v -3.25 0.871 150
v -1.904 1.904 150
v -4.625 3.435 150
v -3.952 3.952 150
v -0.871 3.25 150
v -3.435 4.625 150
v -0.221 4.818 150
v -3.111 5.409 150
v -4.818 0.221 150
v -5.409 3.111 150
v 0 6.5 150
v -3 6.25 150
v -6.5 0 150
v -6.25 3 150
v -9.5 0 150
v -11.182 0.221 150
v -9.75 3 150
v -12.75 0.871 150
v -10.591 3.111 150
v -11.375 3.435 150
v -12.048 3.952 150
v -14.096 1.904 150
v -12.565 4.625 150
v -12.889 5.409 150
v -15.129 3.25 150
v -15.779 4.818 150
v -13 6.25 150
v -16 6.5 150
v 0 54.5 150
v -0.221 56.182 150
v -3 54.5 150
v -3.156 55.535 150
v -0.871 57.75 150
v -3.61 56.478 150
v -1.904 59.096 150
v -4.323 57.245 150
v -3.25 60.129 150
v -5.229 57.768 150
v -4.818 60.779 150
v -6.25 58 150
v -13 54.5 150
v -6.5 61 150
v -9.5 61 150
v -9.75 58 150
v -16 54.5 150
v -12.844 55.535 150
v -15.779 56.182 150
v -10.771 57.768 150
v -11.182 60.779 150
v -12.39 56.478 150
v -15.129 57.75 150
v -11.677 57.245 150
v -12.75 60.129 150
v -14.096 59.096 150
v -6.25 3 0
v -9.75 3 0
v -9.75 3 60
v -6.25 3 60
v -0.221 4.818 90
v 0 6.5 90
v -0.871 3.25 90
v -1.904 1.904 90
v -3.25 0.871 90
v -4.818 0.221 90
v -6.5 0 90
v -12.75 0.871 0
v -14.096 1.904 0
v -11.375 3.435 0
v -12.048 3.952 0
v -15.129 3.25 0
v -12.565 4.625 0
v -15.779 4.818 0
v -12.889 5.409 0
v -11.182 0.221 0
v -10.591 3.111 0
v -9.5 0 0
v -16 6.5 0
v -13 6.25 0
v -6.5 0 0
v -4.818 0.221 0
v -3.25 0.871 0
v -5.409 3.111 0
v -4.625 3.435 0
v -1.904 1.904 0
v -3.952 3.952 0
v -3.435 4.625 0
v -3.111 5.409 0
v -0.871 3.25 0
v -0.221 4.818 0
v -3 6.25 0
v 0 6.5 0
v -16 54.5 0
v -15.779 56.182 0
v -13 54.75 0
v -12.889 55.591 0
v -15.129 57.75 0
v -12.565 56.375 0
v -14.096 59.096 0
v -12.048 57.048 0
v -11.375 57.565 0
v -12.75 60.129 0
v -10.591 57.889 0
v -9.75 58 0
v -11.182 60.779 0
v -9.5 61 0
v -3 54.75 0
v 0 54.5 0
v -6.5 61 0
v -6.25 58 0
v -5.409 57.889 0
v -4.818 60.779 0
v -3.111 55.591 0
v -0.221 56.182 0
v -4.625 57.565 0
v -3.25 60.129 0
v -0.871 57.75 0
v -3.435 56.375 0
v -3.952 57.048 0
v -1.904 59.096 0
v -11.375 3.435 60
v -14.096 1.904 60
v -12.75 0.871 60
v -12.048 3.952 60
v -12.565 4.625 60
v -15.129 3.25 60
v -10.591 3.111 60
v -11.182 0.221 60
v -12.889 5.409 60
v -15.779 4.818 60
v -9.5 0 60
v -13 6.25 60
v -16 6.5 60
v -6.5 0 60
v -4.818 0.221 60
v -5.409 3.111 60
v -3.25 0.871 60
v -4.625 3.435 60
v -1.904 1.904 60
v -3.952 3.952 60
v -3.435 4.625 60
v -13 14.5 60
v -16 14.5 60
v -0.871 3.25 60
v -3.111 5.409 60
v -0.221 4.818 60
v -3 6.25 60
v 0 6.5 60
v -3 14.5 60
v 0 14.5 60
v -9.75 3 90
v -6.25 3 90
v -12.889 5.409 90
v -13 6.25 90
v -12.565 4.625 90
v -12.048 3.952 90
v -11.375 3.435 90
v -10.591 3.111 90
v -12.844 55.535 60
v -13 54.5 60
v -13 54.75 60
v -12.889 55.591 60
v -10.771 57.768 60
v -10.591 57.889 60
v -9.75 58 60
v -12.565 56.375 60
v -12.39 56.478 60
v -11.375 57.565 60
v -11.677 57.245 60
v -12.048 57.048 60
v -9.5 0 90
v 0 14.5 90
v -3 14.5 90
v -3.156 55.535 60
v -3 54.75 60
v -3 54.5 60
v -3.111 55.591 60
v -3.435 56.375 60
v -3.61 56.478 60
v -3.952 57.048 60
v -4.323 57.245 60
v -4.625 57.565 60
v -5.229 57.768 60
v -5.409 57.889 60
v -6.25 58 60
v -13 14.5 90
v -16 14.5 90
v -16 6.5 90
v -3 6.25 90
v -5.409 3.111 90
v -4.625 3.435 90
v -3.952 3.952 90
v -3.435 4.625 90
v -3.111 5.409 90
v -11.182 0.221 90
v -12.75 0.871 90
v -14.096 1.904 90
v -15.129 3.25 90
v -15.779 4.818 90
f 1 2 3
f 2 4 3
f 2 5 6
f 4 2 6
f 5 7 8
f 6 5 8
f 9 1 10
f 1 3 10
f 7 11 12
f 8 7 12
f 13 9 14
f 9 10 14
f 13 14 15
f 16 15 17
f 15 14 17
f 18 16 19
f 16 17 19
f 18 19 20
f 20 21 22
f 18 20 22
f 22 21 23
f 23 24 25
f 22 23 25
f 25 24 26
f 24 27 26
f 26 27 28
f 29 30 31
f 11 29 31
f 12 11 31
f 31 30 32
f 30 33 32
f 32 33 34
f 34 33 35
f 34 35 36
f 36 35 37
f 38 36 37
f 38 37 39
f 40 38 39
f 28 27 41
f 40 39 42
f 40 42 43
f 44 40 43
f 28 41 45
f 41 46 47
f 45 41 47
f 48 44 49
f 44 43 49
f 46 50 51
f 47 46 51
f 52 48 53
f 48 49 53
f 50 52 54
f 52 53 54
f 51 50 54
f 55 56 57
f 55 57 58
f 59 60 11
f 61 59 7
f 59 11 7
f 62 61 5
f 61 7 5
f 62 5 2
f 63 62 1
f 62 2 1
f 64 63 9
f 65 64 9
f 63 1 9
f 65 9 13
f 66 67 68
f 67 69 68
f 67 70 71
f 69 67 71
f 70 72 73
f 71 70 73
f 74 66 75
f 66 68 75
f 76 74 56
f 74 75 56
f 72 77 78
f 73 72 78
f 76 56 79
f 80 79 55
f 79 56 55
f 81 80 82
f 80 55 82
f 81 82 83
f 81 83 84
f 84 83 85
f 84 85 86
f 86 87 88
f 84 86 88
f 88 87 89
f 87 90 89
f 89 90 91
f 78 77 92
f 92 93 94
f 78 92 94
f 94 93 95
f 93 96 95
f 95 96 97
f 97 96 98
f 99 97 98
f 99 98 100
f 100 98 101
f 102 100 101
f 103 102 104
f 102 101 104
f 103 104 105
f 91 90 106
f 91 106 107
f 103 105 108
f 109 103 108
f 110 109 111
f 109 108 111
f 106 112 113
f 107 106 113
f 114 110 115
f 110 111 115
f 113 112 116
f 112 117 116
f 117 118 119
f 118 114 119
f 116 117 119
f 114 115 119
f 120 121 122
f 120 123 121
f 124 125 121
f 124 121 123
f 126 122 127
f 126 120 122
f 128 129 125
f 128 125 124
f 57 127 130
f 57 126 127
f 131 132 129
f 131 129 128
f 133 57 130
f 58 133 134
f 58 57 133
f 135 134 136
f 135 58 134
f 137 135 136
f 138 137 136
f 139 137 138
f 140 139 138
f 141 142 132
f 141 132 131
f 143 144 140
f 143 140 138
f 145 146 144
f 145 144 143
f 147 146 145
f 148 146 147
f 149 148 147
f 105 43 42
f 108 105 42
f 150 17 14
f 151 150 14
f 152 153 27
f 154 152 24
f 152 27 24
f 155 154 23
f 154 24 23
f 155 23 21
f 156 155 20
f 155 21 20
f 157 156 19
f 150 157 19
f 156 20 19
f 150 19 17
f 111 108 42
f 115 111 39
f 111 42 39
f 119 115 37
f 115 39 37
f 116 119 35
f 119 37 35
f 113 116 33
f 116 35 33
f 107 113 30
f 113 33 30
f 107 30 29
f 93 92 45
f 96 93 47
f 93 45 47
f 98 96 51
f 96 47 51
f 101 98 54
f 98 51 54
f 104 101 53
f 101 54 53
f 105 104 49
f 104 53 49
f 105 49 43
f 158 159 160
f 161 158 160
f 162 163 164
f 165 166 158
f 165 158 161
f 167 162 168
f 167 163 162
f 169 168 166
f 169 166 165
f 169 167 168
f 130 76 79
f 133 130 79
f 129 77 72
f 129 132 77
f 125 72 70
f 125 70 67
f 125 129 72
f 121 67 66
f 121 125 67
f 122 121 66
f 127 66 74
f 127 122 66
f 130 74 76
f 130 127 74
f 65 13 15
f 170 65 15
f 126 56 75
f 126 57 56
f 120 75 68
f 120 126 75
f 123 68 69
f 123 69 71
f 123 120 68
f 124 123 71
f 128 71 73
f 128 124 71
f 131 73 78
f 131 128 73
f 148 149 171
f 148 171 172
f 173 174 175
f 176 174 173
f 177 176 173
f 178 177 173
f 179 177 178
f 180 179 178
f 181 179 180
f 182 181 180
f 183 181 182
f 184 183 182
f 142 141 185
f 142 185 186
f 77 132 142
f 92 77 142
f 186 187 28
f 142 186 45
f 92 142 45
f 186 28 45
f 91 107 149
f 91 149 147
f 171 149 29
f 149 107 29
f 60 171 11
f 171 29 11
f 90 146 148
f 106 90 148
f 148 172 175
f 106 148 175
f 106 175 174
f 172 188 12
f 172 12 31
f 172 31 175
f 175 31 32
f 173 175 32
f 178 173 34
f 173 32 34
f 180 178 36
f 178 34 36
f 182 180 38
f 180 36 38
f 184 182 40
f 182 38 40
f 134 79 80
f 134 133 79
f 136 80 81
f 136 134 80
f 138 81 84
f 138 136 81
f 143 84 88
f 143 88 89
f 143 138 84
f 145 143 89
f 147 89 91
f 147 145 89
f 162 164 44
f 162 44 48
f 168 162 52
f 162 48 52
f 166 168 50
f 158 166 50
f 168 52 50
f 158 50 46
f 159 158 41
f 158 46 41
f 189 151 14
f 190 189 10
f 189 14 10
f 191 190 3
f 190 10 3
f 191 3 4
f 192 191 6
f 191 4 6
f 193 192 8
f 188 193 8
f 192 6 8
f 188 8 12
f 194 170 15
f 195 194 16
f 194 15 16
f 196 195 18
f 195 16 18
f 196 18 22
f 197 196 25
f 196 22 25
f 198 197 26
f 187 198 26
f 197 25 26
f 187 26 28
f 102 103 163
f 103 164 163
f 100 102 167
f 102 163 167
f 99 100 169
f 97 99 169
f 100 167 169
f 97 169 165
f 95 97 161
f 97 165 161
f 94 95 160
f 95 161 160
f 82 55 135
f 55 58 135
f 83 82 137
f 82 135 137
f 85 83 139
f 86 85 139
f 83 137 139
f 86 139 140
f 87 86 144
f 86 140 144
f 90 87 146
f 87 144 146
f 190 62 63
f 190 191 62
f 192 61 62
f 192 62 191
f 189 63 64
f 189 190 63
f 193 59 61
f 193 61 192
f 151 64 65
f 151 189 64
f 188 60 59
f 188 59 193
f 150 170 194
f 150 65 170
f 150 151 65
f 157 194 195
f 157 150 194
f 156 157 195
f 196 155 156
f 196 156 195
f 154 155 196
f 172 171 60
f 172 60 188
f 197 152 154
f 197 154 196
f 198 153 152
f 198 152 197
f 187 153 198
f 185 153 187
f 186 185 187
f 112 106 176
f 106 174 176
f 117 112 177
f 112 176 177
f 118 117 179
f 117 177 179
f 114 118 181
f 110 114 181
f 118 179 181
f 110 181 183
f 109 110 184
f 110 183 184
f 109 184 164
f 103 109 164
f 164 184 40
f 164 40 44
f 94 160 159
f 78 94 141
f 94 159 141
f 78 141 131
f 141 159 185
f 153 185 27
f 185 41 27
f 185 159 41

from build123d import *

# Parameters (mm, degrees)
SCHIZZO1_W                   = 16
SCHIZZO1_H                   = 61
SCHIZZO1_W_2                 = 10
SCHIZZO1_H_2                 = 55
ESTRUSIONE_ESTRUSIONE2_DEPTH = 60
RACCORDO1_R                  = 6.5
RACCORDO2_R                  = 3.25
ESTRUSIONE_ESTRUSIONE3_START = 30
ESTRUSIONE_ESTRUSIONE3_DEPTH = 30
ESTRUSIONE_ESTRUSIONE4_START = 60
ESTRUSIONE_ESTRUSIONE4_DEPTH = 60


with BuildPart() as part:
    # Schizzo1 → Estrusione-Estrusione2 (new body)
    with BuildSketch(Plane.XY):
        with Locations((-8, 30.5)):
            Rectangle(SCHIZZO1_W, SCHIZZO1_H)
        with Locations((-8, 30.5)):
            Rectangle(SCHIZZO1_W_2, SCHIZZO1_H_2, mode=Mode.SUBTRACT)
    extrude(amount=ESTRUSIONE_ESTRUSIONE2_DEPTH)

    # Raccordo1
    raccordo1_edges = [part.edges().sort_by_distance(p)[0] for p in [
        (0, 0, 30),
        (-16, 0, 30),
        (-16, 61, 30),
        (0, 61, 30),
    ]]
    fillet(raccordo1_edges, radius=RACCORDO1_R)

    # Raccordo2
    raccordo2_edges = [part.edges().sort_by_distance(p)[0] for p in [
        (-3, 3, 30),
        (-3, 58, 30),
        (-13, 58, 30),
        (-13, 3, 30),
    ]]
    fillet(raccordo2_edges, radius=RACCORDO2_R)

    # Schizzo2 → Estrusione-Estrusione3 (add)
    with BuildSketch(Plane.XY.offset(60).offset(ESTRUSIONE_ESTRUSIONE3_START)):
        with BuildLine():
            Line((-16, 14.5), (-16, 54.5))
            ThreePointArc((-16, 54.5), (-14.096194078, 59.096194078), (-9.5, 61))
            Line((-9.5, 61), (-6.5, 61))
            ThreePointArc((-6.5, 61), (-1.903805922, 59.096194078), (0, 54.5))
            Line((0, 54.5), (0, 14.5))
            Line((0, 14.5), (-3, 14.5))
            Line((-3, 14.5), (-3, 54.5))
            ThreePointArc((-3, 54.5), (-3.937792073, 56.888121647), (-6.25, 58))
            Line((-6.25, 58), (-9.75, 58))
            ThreePointArc((-9.75, 58), (-12.062207927, 56.888121647), (-13, 54.5))
            Line((-13, 54.5), (-13, 14.5))
            Line((-13, 14.5), (-16, 14.5))
        make_face()
    extrude(amount=-ESTRUSIONE_ESTRUSIONE3_DEPTH)

    # Schizzo3 → Estrusione-Estrusione4 (add)
    with BuildSketch(Plane.XY.offset(90).offset(ESTRUSIONE_ESTRUSIONE4_START)):
        with BuildLine():
            Line((-16, 6.5), (-16, 54.5))
            ThreePointArc((-16, 54.5), (-14.096194078, 59.096194078), (-9.5, 61))
            Line((-9.5, 61), (-6.5, 61))
            ThreePointArc((-6.5, 61), (-1.903805922, 59.096194078), (0, 54.5))
            Line((0, 54.5), (0, 6.5))
            ThreePointArc((0, 6.5), (-1.903805922, 1.903805922), (-6.5, 0))
            Line((-6.5, 0), (-9.5, 0))
            ThreePointArc((-9.5, 0), (-14.096194078, 1.903805922), (-16, 6.5))
        make_face()
        with BuildLine():
            Line((-13, 54.5), (-13, 6.25))
            ThreePointArc((-13, 6.25), (-12.048097039, 3.951902961), (-9.75, 3))
            Line((-9.75, 3), (-6.25, 3))
            ThreePointArc((-6.25, 3), (-3.951902961, 3.951902961), (-3, 6.25))
            Line((-3, 6.25), (-3, 54.5))
            ThreePointArc((-3, 54.5), (-3.937792073, 56.888121647), (-6.25, 58))
            Line((-6.25, 58), (-9.75, 58))
            ThreePointArc((-9.75, 58), (-12.062207927, 56.888121647), (-13, 54.5))
        make_face(mode=Mode.SUBTRACT)
    extrude(amount=-ESTRUSIONE_ESTRUSIONE4_DEPTH)


solid = part.part
